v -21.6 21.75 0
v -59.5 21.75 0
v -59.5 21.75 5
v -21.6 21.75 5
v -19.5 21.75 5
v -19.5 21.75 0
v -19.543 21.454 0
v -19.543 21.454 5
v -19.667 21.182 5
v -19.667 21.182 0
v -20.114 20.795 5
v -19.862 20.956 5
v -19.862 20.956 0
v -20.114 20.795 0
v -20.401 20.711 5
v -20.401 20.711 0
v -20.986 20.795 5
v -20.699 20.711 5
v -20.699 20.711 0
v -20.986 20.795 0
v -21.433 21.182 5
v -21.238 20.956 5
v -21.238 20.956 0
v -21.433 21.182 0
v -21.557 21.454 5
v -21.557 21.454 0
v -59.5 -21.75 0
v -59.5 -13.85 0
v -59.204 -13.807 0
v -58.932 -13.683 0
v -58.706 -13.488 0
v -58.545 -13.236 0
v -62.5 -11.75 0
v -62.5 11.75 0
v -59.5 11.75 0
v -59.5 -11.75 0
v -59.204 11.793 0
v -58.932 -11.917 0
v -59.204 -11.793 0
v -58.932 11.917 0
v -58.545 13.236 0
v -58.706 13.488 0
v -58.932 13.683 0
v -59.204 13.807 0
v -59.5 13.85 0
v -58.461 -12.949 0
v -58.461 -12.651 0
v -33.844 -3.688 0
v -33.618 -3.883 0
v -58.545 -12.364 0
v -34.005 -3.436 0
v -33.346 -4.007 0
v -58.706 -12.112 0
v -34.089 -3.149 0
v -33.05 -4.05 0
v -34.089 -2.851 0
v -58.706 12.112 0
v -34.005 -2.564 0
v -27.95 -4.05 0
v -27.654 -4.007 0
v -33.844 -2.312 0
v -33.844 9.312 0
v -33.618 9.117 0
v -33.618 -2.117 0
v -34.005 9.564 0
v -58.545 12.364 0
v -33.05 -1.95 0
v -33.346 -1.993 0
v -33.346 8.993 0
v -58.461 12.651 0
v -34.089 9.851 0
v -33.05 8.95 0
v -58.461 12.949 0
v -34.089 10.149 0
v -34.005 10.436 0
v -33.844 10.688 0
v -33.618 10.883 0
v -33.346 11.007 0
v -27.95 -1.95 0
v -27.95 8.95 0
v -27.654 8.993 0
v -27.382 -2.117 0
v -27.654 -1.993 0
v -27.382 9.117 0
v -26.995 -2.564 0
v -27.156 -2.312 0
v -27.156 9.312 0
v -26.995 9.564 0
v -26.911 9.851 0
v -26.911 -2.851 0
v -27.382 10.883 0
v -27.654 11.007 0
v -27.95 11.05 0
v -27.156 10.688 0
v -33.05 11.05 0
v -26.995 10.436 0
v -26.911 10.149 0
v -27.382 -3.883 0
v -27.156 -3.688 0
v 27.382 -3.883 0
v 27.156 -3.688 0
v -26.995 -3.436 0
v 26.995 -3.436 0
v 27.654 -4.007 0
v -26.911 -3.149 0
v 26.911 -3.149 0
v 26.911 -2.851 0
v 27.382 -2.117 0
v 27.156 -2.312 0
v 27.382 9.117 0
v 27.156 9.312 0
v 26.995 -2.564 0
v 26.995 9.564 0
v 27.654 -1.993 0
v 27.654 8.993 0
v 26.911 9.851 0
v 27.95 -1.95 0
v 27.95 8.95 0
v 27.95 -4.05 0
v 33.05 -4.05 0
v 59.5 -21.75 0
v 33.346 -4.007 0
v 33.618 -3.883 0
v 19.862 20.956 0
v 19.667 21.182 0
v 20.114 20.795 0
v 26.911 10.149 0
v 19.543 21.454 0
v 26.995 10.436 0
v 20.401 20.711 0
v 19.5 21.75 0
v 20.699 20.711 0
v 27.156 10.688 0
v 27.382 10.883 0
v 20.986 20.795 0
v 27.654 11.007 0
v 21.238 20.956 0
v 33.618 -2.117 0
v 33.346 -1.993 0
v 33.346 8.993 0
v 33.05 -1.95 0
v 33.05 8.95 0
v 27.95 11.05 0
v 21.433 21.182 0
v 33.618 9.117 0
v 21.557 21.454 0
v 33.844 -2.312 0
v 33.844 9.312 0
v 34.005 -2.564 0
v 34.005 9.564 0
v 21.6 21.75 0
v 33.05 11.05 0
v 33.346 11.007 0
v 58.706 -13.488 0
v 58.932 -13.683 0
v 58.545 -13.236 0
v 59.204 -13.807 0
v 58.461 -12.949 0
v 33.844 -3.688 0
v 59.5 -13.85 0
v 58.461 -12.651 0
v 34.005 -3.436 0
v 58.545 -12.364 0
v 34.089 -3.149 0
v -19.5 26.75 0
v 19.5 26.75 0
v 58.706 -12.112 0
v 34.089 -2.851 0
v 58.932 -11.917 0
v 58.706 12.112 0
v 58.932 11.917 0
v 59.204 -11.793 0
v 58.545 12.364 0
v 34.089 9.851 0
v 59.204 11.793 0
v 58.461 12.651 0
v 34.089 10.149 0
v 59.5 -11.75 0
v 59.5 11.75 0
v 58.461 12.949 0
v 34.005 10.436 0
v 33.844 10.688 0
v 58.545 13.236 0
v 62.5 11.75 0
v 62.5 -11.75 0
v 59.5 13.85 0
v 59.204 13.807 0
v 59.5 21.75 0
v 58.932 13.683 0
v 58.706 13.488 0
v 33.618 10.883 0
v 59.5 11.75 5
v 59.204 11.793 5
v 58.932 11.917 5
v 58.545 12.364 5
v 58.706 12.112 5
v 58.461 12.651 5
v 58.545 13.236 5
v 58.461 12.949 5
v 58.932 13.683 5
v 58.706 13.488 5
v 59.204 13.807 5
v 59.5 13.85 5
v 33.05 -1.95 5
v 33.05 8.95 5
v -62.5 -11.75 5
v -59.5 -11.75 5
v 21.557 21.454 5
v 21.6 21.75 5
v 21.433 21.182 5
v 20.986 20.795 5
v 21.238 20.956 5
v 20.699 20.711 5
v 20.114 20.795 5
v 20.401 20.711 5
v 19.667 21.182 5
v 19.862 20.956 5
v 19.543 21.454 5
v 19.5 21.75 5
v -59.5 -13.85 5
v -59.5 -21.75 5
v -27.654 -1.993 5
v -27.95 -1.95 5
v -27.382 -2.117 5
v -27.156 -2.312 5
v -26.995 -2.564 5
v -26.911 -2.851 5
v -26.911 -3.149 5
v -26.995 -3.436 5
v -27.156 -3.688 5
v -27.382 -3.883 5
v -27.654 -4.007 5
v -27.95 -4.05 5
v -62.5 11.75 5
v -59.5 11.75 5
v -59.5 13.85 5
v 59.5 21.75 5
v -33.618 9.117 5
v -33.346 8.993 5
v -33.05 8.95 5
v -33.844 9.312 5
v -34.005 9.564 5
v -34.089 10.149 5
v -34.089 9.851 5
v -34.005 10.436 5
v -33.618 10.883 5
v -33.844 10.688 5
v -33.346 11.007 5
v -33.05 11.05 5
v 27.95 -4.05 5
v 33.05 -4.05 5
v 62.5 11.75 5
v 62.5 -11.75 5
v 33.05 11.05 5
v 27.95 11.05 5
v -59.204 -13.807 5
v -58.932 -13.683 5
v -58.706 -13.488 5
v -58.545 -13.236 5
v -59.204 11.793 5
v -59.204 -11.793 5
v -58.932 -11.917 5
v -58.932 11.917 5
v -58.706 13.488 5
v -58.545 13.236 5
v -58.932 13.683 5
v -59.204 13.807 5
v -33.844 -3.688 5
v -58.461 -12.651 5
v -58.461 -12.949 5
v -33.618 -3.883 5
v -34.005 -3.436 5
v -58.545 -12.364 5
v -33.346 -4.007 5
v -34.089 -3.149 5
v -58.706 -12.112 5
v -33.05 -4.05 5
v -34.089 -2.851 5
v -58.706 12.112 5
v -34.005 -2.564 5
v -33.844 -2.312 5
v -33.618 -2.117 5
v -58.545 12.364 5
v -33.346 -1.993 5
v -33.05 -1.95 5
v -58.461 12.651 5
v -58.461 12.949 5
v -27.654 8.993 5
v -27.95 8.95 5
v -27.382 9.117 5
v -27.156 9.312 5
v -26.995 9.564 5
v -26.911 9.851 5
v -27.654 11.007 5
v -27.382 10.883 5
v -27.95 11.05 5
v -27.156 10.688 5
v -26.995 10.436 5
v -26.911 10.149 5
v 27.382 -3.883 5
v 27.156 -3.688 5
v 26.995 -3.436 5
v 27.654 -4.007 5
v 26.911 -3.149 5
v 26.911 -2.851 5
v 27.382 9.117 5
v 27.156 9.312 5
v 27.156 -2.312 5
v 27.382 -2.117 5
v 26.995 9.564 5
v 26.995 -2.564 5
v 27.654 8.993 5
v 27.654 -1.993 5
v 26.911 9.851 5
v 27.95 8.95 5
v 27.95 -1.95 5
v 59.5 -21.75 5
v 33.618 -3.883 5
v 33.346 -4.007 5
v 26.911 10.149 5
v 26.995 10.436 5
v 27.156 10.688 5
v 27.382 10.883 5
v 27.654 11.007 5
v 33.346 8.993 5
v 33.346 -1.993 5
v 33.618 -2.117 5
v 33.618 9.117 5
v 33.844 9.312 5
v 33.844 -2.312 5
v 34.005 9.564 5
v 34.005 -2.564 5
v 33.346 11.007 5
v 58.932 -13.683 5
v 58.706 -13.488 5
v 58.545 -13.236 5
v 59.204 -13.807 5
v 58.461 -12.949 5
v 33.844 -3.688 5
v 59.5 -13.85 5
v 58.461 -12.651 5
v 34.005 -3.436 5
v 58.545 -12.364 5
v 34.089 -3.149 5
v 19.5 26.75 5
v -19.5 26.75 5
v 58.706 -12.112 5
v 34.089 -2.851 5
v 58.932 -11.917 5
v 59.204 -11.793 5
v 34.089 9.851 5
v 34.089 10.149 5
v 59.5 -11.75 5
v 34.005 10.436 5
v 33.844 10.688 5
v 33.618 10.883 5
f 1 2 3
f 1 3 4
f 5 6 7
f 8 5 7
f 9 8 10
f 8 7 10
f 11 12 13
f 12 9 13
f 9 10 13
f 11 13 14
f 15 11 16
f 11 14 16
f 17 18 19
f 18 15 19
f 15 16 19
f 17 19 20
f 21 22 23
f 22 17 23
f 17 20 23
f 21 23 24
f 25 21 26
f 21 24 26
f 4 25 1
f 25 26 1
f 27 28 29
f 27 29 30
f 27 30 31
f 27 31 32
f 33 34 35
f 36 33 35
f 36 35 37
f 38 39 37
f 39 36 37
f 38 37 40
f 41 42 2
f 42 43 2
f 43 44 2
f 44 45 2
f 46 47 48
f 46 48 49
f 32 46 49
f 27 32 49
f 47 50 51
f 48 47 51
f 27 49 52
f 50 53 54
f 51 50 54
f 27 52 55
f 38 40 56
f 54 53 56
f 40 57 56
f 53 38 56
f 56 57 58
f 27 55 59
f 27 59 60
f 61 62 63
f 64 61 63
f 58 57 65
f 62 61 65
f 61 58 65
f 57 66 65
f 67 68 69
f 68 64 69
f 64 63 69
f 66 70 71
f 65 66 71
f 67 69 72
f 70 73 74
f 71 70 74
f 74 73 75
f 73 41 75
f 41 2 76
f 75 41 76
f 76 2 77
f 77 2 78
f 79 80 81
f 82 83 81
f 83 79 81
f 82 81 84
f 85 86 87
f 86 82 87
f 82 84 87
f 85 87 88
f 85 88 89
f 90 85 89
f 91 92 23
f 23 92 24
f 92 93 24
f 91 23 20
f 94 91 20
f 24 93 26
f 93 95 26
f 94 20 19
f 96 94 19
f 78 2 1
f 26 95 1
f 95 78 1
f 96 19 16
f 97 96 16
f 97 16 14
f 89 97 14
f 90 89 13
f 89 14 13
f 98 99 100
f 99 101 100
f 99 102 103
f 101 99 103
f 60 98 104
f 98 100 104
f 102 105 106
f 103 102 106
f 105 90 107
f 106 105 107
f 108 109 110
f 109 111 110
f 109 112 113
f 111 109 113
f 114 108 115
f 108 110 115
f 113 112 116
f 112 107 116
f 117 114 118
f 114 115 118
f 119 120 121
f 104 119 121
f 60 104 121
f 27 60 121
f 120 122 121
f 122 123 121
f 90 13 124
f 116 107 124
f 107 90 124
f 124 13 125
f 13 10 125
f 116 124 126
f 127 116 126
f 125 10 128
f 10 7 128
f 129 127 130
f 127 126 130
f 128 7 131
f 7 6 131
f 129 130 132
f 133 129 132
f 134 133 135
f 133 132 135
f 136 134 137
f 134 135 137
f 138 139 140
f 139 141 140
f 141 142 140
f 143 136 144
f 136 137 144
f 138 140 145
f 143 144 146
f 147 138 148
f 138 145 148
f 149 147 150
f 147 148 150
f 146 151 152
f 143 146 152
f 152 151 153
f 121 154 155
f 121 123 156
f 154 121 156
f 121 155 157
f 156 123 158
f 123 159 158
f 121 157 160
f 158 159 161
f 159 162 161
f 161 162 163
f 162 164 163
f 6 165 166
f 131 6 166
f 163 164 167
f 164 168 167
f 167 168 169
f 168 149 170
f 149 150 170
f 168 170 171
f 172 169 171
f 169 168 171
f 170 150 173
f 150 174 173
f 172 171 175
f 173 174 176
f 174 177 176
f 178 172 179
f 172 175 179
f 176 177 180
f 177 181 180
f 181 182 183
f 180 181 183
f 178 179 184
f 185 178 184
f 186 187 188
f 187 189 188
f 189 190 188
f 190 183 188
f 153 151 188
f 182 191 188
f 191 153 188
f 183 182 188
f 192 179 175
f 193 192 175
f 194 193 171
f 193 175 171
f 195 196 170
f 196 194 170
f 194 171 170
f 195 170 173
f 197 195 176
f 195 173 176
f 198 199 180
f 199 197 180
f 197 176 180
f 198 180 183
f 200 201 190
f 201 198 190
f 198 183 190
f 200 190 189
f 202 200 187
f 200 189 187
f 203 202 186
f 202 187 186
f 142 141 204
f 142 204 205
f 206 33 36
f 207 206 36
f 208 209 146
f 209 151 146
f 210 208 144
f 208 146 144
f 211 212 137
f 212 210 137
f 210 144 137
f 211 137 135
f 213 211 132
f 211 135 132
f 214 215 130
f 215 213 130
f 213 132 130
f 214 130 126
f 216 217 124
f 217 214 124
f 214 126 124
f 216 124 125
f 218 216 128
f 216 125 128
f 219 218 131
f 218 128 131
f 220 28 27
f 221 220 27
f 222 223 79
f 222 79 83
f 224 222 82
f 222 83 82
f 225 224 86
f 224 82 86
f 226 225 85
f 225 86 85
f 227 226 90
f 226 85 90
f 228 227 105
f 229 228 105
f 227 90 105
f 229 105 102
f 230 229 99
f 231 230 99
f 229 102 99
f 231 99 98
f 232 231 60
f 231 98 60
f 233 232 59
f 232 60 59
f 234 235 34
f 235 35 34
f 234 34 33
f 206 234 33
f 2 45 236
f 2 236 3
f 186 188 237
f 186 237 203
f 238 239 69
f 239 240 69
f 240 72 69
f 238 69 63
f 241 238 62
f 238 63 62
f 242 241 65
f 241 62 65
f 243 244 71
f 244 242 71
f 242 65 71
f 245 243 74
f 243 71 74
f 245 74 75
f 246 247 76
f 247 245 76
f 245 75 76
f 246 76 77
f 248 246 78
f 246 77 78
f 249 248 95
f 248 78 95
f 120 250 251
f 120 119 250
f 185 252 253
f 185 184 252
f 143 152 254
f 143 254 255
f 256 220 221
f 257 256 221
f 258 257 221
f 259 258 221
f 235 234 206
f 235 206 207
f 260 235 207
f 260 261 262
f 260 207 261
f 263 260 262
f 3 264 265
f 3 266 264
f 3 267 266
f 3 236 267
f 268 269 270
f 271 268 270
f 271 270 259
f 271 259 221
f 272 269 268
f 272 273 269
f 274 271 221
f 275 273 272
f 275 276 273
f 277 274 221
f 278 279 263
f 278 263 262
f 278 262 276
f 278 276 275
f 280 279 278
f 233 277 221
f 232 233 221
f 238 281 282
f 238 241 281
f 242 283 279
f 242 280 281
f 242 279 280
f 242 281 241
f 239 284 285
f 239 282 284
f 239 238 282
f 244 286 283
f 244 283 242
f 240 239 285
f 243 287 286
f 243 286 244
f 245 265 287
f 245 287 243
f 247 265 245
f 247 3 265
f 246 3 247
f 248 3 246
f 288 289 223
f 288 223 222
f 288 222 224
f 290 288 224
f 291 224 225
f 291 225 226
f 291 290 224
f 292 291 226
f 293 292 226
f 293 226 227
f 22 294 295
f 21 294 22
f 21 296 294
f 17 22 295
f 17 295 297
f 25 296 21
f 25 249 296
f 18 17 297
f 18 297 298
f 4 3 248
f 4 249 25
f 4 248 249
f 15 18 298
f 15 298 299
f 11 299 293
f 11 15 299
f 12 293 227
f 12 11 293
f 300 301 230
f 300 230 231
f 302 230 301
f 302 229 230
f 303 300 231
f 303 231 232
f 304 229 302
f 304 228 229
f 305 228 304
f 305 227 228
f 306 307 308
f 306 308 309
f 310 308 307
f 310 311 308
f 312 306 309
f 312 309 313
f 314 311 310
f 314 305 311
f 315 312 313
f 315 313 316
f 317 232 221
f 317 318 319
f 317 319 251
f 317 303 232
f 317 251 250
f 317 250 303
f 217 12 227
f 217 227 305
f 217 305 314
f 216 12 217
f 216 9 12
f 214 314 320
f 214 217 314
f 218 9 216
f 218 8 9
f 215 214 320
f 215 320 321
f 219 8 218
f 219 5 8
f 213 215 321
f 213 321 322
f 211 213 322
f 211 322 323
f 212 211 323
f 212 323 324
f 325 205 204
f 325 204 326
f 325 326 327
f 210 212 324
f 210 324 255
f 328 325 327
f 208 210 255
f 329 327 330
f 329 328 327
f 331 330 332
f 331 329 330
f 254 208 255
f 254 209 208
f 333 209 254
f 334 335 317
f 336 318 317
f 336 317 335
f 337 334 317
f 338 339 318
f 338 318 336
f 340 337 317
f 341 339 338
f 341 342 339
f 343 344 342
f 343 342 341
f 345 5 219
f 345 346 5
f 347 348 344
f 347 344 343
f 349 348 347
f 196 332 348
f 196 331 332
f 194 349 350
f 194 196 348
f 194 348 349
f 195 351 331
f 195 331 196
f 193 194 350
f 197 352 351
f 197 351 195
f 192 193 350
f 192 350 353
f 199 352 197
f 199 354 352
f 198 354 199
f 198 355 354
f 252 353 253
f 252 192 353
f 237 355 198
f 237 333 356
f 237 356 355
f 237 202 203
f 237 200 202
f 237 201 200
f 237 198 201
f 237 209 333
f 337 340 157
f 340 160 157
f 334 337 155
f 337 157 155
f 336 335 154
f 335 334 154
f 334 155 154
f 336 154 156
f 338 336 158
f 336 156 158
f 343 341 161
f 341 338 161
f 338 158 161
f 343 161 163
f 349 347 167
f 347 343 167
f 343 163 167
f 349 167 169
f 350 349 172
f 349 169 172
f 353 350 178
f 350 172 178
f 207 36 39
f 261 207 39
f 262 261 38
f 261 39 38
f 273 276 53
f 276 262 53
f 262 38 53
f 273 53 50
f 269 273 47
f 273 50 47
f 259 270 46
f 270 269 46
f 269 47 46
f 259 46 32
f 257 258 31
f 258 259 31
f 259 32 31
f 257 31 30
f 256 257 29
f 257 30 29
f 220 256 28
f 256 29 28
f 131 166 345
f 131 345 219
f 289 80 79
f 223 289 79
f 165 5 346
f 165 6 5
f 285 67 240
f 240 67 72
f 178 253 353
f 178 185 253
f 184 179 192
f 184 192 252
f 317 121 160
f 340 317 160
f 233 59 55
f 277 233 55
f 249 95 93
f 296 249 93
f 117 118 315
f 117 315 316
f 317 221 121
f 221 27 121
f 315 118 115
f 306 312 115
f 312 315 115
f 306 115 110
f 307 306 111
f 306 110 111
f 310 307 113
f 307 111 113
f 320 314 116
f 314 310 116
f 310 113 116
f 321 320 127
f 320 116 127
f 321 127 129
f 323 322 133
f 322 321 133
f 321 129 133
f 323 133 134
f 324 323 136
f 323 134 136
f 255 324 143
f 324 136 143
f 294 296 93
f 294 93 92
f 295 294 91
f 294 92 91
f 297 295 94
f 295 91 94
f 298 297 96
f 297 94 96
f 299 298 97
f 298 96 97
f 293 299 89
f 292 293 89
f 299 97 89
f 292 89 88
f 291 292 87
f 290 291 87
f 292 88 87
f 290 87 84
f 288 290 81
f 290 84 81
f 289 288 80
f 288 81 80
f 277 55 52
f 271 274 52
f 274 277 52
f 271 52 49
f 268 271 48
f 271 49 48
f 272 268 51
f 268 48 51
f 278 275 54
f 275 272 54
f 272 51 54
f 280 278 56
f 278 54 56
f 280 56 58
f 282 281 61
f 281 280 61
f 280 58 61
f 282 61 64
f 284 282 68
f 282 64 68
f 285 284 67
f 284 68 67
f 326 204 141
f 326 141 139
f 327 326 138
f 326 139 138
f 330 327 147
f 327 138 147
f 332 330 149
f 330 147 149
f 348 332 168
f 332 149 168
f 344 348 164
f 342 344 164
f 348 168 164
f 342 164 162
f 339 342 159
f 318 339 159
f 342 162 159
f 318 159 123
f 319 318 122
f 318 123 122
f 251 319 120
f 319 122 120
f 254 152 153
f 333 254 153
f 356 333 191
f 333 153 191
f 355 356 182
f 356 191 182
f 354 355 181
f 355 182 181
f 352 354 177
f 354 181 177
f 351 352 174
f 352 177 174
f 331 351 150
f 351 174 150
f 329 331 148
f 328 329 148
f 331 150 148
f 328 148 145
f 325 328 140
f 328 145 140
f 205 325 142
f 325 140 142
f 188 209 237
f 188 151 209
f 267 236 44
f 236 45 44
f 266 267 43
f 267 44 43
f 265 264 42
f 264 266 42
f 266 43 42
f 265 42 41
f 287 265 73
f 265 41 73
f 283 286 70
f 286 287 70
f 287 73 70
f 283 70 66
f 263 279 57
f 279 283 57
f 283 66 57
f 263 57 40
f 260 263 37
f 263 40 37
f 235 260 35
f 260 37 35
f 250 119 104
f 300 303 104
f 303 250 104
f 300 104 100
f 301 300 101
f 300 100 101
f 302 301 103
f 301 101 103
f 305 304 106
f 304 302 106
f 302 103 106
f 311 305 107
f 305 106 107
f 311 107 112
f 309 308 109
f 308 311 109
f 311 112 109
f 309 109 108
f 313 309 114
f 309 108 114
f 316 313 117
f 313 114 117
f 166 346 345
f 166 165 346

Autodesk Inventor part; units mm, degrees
ref_plane "YZ Plane" through (0, 0, 0) normal (1, 0, 0) x (0, 1, 0)
ref_plane "XZ Plane" through (0, 0, 0) normal (0, 1, 0) x (-1, 0, 0)
ref_plane "XY Plane" through (0, 0, 0) normal (0, 0, 1) x (1, 0, 0)
sketch "スケッチ1" plane through (0, 0, 0) normal (0, 0, 1) x (1, 0, 0)
  line L0 (-59.5, -21.75) -> (59.5, -21.75) construction
  line L1 (59.5, -21.75) -> (59.5, 21.75) construction
  line L2 (59.5, 21.75) -> (-59.5, 21.75) construction
  line L3 (-59.5, 21.75) -> (-59.5, -21.75) construction
  line L4 (-59.5, -21.75) -> (59.5, 21.75) construction
  line L5 (59.5, -21.75) -> (-59.5, 21.75) construction
  line L6 (-54.5, -16.75) -> (54.5, -16.75) construction
  line L7 (54.5, -16.75) -> (54.5, 16.75) construction
  line L8 (54.5, 16.75) -> (-54.5, 16.75) construction
  line L9 (-54.5, 16.75) -> (-54.5, -16.75) construction
  line L10 (-54.5, -16.75) -> (54.5, 16.75) construction
  line L11 (54.5, -16.75) -> (-54.5, 16.75) construction
  line L12 (-33.05, 11.05) -> (-27.95, 11.05)
  line L13 (-27.95, 11.05) -> (-27.95, -4.05)
  line L14 (-27.95, -4.05) -> (-33.05, -4.05)
  line L15 (-33.05, -4.05) -> (-33.05, 11.05)
  line L16 (-28, 11) -> (-33, 11) construction
  line L17 (-33, 11) -> (-33, -4) construction
  line L18 (-33, -4) -> (-28, -4) construction
  line L19 (-28, -4) -> (-28, 11) construction
  line L20 (-30.5, 11) -> (-30.5, -4) construction
  line L21 (-33, 21) -> (-28, 21) construction
  line L22 (-28, 21) -> (-28, -14) construction
  line L23 (-28, -14) -> (-33, -14) construction
  line L24 (-33, -14) -> (-33, 21) construction
  circle A0 centre (-30.5, 17) radius 1.55
  circle A1 centre (-30.5, -10) radius 1.55
  circle A2 centre (-33.05, 10) radius 1.05
  circle A3 centre (-27.95, 10) radius 1.05
  circle A4 centre (-33.05, -3) radius 1.05
  circle A5 centre (-27.95, -3) radius 1.05
  line L25 (0, 0) -> (0, 16.75) construction
  line L26 (0, 0) -> (54.5, 0) construction
  circle A6 centre (30.5, 17) radius 1.55
  circle A7 centre (30.5, -10) radius 1.55
  circle A8 centre (27.95, 10) radius 1.05
  circle A9 centre (33.05, 10) radius 1.05
  circle A10 centre (27.95, -3) radius 1.05
  circle A11 centre (33.05, -3) radius 1.05
  line L27 (33.05, 11.05) -> (27.95, 11.05)
  line L28 (27.95, 11.05) -> (27.95, -4.05)
  line L29 (27.95, -4.05) -> (33.05, -4.05)
  line L30 (33.05, -4.05) -> (33.05, 11.05)
  line L31 (-59.5, 11.75) -> (-62.5, 11.75)
  line L32 (-62.5, 11.75) -> (-62.5, -11.75)
  line L33 (-62.5, -11.75) -> (-59.5, -11.75)
  line L34 (-59.5, 13.85) -> (-59.5, 21.75)
  line L35 (-59.5, 21.75) -> (-21.6, 21.75)
  line L36 (-19.5, 21.75) -> (-19.5, 26.75)
  line L37 (-19.5, 26.75) -> (19.5, 26.75)
  line L38 (19.5, 26.75) -> (19.5, 21.75)
  line L39 (21.6, 21.75) -> (59.5, 21.75)
  line L40 (59.5, 21.75) -> (59.5, 13.85)
  line L41 (59.5, 11.75) -> (62.5, 11.75)
  line L42 (62.5, 11.75) -> (62.5, -11.75)
  line L43 (62.5, -11.75) -> (59.5, -11.75)
  line L44 (-59.5, -13.85) -> (-59.5, -21.75)
  line L45 (-59.5, -21.75) -> (59.5, -21.75)
  line L46 (59.5, -21.75) -> (59.5, -13.85)
  arc A12 (-59.5, 11.75) -> (-59.5, 13.85) centre (-59.5, 12.8) ccw
  arc A13 (-59.5, -13.85) -> (-59.5, -11.75) centre (-59.5, -12.8) ccw
  line L47 (0, 0) -> (-54.5, 0) construction
  arc A14 (59.5, -11.75) -> (59.5, -13.85) centre (59.5, -12.8) ccw
  arc A15 (59.5, 13.85) -> (59.5, 11.75) centre (59.5, 12.8) ccw
  arc A16 (-21.6, 21.75) -> (-19.5, 21.75) centre (-20.55, 21.75) ccw
  arc A17 (19.5, 21.75) -> (21.6, 21.75) centre (20.55, 21.75) ccw
  line L48 (-56.8855, 19.3) -> (-54.5, 19.3) construction
  line L49 (-54.5, 19.3) -> (-54.5, 16.2) construction
  line L50 (-54.5, 16.2) -> (-56.8855, 16.2) construction
  line L51 (-56.8855, 16.2) -> (-56.8855, 19.3) construction
  line L52 (-54.5, 17.75) -> (-56.8855, 17.75) construction
  line L53 (-53.05, 22.7202) -> (-49.95, 22.7202) construction
  line L54 (-49.95, 22.7202) -> (-49.95, 16.75) construction
  line L55 (-49.95, 16.75) -> (-53.05, 16.75) construction
  line L56 (-53.05, 16.75) -> (-53.05, 22.7202) construction
  line L57 (-51.5, 22.7202) -> (-51.5, 16.75) construction
  point P0 (-30.5, -14)
  dimension "d10" = 2.1
  dimension "d0" = 33.5
  dimension "d1" = 5
  dimension "d2" = 109
  dimension "d3" = 5
  dimension "d4" = 0.05
  dimension "d5" = 35
  dimension "d6" = 27
  dimension "d7" = 5
  dimension "d11" = 33
  dimension "d12" = 3.1
  dimension "d13" = 1.05
  dimension "d14" = 3
  dimension "d15" = 4
  dimension "d16" = 3.1
  dimension "d17" = 10
  dimension "d18" = 5
  dimension "d19" = 8
  dimension "d20" = 5
  dimension "d21" = 40
  dimension "d22" = 5
  dimension "d50" = 4
  dimension "d51" = 10
  dimension "d52" = 17
  dimension "d53" = 10
extrude "押し出し1" add sketch "スケッチ1" along normal blind 5
ref_plane "作業平面1" through (23, -13.75, 5) normal (-1, 0, 0) x (0, 0, 1)
sketch "スケッチ7" plane through (23, -13.75, 5) normal (-1, 0, 0) x (0, 0, 1)
  point P0 (-5, 13.75)
sketch "スケッチ9" plane through (0, 0, 5) normal (0, 0, 1) x (1, 0, 0)
  circle A0 centre (-30.5, 17) radius 1.55 projected
  circle A1 centre (-30.5, 17) radius 1.55
  circle A2 centre (-30.5, -10) radius 1.55 projected
  circle A3 centre (-30.5, -10) radius 1.55
  circle A4 centre (30.5, 17) radius 1.55 projected
  circle A5 centre (30.5, 17) radius 1.55
  circle A6 centre (30.5, -10) radius 1.55 projected
  circle A7 centre (30.5, -10) radius 1.55
  point P0 (0, 0)
extrude "押し出し5" add sketch "スケッチ9" against normal up to surface (5 mm away)
equation "\"d20\" = d18"
equation "\"d53\" = d51"
properties part number "コックピット_サブフレーム_1_3" material "アセタール樹脂、黒"
